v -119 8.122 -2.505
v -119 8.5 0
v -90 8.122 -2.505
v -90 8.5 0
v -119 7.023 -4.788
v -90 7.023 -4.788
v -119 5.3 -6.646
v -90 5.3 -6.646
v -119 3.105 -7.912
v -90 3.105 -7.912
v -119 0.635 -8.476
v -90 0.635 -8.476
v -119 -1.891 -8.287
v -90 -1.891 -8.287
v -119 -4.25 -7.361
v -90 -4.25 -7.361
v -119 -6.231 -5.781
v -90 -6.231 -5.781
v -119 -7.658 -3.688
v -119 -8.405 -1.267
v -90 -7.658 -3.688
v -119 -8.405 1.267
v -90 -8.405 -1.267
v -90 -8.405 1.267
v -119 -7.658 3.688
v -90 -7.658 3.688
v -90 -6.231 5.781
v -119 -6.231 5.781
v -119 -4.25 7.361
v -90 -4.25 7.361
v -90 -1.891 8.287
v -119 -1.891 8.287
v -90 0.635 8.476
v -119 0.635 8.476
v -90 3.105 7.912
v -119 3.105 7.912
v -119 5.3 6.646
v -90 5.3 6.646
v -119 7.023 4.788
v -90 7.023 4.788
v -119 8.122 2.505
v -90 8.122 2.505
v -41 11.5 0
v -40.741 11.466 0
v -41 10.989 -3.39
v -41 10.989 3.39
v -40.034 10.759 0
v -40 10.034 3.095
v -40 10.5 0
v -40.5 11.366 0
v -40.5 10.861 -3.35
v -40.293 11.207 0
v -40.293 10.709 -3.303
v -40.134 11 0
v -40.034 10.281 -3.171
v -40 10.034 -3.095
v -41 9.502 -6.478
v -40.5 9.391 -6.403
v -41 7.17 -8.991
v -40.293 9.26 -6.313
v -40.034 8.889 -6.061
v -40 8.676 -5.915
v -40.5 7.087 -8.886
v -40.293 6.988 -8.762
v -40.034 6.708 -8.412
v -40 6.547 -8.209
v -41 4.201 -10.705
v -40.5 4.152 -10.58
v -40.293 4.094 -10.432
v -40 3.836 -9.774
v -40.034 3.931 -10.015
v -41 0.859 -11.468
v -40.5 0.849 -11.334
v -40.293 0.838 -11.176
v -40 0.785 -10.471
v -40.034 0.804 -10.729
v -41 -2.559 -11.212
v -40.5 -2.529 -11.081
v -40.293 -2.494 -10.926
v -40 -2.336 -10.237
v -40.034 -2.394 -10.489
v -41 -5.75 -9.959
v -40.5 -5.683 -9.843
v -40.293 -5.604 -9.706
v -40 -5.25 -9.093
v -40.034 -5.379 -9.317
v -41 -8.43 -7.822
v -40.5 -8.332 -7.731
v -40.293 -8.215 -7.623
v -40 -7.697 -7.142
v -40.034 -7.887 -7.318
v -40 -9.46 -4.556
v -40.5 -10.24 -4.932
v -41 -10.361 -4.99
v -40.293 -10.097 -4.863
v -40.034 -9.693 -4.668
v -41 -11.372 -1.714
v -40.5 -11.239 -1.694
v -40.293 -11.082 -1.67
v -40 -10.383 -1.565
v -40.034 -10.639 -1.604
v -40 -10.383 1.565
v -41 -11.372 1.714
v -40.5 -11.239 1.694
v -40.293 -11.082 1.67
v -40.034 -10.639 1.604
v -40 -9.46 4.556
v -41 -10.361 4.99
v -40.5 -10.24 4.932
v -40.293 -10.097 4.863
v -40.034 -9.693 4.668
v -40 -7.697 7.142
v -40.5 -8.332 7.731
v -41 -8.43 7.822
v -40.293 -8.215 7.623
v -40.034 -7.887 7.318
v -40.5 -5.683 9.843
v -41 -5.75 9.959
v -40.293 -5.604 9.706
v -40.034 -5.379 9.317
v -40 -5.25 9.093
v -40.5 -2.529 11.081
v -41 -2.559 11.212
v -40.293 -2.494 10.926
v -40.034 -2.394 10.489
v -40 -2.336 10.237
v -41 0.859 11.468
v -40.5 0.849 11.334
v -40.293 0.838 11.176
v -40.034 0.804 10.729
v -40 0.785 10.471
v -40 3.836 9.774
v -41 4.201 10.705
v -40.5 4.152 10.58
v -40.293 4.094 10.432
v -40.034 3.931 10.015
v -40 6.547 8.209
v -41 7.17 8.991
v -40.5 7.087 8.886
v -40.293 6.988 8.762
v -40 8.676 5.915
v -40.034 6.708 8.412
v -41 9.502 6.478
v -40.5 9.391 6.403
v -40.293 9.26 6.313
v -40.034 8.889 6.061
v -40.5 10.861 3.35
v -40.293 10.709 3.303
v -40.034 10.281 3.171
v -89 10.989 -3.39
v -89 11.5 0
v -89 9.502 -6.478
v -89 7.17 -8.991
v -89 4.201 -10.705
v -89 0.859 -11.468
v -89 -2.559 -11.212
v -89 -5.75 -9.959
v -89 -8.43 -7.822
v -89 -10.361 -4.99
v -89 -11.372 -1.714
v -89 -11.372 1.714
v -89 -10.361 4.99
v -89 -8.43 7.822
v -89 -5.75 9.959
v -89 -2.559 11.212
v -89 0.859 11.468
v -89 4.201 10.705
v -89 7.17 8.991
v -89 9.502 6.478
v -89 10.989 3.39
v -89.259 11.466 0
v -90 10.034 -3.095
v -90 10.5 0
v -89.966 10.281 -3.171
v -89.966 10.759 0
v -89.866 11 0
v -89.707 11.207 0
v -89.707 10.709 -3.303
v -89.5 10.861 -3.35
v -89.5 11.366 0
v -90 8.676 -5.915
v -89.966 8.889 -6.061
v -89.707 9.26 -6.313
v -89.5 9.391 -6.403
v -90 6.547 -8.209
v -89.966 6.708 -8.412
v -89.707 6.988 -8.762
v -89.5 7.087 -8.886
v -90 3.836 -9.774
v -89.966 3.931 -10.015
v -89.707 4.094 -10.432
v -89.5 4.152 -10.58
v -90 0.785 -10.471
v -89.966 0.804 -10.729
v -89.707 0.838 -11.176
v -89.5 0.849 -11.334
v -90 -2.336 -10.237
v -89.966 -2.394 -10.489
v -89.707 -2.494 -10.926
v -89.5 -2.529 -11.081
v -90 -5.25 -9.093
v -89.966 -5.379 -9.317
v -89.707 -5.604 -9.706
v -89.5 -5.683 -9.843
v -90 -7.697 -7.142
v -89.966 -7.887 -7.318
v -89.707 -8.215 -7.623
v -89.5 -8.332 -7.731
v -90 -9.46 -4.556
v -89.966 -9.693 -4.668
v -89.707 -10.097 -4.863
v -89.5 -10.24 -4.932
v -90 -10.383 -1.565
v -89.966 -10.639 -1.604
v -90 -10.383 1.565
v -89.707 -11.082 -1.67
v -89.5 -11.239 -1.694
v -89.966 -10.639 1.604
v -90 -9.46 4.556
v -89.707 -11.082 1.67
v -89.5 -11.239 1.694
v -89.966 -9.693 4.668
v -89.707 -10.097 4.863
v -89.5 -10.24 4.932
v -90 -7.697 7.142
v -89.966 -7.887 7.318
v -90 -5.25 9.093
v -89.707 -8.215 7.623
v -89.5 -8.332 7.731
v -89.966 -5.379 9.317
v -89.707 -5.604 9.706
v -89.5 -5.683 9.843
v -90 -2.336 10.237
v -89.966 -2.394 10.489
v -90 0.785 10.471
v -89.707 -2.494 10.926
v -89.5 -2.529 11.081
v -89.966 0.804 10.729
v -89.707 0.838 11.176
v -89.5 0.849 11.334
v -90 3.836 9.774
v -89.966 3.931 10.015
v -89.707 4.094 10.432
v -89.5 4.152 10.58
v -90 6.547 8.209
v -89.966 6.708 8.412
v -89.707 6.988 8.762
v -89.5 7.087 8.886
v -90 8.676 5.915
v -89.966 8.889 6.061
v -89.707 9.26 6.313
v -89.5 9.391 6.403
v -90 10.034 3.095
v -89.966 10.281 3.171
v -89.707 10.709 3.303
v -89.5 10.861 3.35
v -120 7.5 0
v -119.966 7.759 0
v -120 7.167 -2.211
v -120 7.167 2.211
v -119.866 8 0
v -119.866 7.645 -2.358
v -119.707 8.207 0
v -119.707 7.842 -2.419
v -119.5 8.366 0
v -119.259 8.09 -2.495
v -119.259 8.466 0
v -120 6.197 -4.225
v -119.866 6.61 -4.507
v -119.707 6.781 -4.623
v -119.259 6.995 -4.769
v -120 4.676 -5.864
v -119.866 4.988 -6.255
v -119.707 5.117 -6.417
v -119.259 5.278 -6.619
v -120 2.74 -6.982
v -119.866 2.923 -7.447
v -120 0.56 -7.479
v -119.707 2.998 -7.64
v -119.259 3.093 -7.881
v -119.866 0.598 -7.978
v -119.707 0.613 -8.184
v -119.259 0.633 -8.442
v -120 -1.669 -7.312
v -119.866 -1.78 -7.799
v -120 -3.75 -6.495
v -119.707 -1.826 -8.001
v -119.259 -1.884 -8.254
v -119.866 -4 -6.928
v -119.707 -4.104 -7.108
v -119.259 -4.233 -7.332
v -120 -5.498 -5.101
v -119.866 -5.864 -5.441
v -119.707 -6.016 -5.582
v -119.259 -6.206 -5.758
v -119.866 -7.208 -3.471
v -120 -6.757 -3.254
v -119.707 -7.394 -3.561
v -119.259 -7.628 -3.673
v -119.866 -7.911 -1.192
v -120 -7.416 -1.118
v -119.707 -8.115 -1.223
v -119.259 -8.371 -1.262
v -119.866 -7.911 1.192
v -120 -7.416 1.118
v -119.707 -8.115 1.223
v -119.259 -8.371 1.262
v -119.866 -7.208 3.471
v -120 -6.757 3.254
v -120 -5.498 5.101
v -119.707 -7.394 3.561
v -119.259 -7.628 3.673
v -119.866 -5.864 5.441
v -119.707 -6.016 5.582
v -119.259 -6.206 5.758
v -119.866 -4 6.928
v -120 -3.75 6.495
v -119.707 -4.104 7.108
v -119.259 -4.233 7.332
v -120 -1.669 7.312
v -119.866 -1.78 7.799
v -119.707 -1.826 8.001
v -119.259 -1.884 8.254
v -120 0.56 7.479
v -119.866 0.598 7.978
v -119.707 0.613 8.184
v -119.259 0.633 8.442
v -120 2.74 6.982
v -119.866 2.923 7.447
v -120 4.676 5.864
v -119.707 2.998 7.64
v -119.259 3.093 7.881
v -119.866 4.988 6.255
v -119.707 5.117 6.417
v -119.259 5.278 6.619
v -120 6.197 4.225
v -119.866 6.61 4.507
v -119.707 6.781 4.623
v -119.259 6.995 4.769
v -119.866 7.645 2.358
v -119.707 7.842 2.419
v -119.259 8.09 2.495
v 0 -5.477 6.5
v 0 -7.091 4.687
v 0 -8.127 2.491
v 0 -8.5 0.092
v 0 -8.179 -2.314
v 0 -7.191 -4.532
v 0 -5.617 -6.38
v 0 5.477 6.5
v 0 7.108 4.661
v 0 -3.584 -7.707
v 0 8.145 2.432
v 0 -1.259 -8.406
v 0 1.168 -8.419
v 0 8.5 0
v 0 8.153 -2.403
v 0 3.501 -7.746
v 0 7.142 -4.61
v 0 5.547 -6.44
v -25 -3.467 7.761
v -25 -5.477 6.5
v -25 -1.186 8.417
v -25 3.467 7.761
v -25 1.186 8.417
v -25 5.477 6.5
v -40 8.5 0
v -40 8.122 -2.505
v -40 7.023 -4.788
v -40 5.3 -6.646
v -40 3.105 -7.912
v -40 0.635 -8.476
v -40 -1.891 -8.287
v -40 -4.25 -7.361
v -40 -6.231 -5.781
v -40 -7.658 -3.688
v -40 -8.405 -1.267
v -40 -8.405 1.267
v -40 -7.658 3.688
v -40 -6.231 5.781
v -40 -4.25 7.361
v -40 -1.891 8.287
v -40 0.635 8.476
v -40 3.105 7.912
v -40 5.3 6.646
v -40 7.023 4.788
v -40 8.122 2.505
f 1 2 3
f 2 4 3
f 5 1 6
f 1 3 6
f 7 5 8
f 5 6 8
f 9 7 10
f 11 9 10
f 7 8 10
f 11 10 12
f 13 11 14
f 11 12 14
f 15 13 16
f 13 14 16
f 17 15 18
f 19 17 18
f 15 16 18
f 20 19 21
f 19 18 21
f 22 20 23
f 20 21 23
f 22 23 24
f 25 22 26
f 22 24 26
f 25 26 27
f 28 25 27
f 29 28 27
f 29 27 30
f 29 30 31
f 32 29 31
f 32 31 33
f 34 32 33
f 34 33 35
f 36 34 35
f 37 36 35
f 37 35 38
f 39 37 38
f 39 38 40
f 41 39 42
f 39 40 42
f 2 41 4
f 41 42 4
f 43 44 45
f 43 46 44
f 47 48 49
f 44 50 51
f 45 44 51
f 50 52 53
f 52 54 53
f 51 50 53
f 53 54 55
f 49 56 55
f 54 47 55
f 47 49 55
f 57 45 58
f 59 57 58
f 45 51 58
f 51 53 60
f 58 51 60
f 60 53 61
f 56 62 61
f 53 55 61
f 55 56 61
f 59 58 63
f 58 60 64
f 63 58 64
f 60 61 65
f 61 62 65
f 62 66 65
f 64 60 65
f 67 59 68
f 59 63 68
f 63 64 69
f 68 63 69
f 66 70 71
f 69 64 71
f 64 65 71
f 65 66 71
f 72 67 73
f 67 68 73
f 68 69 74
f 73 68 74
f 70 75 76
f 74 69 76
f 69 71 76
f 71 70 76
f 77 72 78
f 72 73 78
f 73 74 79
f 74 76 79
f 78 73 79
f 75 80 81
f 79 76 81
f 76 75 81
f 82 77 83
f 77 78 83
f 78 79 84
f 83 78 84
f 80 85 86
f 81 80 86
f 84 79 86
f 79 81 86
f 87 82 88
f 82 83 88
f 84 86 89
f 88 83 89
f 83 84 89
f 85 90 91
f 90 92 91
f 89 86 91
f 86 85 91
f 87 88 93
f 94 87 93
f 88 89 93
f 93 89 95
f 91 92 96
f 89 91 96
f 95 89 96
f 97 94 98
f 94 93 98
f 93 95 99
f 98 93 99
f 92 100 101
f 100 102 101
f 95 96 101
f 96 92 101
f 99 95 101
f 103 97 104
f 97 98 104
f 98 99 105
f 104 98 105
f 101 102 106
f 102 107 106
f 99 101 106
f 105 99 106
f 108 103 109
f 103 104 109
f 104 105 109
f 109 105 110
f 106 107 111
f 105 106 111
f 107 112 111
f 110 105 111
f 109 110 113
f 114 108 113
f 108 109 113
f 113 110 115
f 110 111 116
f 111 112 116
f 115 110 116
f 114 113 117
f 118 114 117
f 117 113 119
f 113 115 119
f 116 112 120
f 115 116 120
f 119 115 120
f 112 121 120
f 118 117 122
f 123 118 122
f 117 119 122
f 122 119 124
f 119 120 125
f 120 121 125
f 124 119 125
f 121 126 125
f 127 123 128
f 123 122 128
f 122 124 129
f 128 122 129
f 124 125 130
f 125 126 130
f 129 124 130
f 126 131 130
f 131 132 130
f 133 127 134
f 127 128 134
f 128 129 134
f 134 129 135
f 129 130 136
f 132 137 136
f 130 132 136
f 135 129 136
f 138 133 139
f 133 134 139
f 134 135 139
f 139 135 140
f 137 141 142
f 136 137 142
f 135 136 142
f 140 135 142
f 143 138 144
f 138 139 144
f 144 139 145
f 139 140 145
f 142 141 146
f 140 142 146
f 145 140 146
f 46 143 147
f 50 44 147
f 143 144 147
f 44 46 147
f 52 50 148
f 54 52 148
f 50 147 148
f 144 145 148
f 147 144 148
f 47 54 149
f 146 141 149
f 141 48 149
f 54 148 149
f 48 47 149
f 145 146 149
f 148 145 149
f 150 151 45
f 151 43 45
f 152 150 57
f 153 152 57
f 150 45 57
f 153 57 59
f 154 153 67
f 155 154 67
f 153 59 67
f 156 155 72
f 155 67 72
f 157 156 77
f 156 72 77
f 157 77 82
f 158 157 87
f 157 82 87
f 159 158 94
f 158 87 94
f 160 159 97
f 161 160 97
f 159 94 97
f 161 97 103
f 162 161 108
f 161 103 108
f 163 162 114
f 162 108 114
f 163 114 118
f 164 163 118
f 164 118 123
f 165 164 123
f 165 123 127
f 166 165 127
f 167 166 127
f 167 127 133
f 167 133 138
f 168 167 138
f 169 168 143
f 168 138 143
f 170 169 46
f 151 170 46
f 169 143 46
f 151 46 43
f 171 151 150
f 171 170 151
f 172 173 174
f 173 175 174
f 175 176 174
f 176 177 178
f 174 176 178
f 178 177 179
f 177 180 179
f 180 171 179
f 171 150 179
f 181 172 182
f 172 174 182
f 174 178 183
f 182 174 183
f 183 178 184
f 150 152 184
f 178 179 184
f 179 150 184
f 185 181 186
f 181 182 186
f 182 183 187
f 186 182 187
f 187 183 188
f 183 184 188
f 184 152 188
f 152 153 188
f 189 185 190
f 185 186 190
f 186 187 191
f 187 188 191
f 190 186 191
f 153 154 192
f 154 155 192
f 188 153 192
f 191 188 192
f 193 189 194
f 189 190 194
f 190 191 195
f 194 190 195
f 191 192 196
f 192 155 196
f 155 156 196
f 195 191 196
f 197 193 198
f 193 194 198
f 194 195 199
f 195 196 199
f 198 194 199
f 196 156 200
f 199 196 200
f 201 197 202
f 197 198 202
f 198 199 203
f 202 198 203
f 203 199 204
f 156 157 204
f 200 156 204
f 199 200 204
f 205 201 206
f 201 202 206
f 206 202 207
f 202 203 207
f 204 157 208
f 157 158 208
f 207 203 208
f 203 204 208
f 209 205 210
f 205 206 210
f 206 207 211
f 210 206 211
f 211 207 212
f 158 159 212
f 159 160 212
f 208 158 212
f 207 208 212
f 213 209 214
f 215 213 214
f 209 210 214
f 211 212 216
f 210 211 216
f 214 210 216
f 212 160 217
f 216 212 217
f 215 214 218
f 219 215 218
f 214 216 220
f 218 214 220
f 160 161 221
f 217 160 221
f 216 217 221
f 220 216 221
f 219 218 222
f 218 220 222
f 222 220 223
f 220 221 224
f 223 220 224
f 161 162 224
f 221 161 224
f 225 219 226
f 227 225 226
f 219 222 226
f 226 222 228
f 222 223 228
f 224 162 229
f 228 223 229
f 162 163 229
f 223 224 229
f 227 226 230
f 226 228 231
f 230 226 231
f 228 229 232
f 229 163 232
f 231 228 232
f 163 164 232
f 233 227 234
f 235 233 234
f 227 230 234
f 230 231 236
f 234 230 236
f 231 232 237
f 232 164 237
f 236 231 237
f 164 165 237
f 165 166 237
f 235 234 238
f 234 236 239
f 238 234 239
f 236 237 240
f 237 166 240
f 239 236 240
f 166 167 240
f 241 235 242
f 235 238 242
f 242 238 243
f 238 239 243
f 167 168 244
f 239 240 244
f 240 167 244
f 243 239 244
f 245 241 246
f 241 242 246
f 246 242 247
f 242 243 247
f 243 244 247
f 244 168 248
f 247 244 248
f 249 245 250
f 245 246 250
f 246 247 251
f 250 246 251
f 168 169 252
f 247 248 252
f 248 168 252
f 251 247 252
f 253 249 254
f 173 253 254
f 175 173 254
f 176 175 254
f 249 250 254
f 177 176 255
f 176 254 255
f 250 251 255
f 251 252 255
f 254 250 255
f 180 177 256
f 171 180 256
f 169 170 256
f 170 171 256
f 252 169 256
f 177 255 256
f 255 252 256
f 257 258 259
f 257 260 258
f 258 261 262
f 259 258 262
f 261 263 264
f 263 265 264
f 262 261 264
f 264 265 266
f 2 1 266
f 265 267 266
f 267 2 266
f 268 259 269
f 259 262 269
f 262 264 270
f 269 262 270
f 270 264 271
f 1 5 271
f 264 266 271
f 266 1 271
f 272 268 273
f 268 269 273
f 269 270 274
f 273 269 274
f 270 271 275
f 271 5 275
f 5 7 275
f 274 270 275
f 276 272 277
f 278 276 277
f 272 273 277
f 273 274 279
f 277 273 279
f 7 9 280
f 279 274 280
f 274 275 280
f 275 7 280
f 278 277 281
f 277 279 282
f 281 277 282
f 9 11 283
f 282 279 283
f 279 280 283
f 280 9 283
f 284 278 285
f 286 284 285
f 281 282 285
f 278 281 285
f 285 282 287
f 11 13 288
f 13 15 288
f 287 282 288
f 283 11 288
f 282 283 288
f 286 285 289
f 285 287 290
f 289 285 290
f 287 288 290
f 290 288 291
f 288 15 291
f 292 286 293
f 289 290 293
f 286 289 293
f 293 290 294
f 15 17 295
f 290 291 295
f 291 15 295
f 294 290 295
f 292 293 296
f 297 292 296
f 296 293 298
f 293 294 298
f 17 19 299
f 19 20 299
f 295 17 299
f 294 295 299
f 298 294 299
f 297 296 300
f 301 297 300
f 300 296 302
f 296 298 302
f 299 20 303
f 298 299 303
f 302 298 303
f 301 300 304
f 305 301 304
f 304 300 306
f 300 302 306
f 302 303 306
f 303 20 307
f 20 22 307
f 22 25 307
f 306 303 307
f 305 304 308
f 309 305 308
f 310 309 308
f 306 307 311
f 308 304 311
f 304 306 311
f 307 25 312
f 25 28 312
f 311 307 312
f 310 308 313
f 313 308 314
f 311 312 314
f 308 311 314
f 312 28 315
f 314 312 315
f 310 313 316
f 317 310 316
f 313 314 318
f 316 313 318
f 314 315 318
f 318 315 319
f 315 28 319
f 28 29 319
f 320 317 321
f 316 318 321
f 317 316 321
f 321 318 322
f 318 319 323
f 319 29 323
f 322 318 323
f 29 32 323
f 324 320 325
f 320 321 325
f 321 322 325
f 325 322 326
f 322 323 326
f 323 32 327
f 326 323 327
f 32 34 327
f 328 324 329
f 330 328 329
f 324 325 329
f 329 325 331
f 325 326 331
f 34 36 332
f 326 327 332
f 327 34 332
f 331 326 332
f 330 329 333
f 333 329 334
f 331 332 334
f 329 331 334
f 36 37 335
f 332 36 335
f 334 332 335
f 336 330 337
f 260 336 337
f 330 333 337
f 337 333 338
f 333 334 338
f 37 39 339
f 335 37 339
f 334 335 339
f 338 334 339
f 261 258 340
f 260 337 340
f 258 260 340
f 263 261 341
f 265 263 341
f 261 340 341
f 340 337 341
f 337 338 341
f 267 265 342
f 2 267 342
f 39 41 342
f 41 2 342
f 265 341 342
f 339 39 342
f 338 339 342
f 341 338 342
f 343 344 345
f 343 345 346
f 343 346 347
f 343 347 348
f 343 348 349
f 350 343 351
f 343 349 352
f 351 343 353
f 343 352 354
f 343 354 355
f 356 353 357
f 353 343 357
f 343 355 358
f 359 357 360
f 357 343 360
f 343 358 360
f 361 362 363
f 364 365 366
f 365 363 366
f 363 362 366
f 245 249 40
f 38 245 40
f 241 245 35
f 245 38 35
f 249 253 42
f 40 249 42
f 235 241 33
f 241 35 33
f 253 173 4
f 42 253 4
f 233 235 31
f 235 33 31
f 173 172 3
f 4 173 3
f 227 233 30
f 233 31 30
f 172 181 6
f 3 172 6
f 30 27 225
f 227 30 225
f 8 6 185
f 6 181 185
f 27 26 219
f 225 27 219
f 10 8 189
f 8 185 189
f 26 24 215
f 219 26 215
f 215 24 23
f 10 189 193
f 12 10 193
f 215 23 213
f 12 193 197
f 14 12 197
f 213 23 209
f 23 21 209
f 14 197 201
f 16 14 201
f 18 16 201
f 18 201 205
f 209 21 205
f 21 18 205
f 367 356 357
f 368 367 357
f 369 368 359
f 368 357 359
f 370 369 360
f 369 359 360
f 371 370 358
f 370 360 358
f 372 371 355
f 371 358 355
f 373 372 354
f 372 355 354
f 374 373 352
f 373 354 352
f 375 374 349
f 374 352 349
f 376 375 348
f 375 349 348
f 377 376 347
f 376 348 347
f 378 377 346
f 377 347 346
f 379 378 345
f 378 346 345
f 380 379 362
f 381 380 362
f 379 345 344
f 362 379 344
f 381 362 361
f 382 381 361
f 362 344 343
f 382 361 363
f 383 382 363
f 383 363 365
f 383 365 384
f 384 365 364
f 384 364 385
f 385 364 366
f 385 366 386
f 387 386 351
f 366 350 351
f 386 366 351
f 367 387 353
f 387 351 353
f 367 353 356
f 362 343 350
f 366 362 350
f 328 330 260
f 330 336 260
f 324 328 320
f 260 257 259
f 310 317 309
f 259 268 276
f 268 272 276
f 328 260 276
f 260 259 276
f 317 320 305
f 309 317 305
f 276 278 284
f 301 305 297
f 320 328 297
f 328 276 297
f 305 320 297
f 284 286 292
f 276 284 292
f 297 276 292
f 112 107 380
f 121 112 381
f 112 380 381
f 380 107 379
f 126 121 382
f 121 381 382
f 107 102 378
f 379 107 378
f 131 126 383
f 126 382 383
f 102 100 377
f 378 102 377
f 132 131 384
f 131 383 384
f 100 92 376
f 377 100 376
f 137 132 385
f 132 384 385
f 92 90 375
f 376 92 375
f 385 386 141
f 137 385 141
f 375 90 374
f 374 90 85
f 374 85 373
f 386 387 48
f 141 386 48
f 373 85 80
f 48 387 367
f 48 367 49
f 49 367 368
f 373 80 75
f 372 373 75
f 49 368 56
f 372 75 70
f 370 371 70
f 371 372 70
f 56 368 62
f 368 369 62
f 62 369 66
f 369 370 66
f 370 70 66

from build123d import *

# Parameters (mm, degrees)
ENL_V_MAT_EXTRU_6_DEPTH = 25


with BuildPart() as part:
    # Esquisse1 → Révolution1 (revolve)
    with BuildSketch(Plane.XY):
        with BuildLine():
            Line((0, 0), (-120, 0))
            Line((-120, 0), (-120, 7.5))
            ThreePointArc((-120, 7.5), (-119.707106781, 8.207106781), (-119, 8.5))
            Line((-119, 8.5), (-90, 8.5))
            Line((-90, 8.5), (-90, 10.5))
            ThreePointArc((-90, 10.5), (-89.707106781, 11.207106781), (-89, 11.5))
            Line((-89, 11.5), (-41, 11.5))
            ThreePointArc((-41, 11.5), (-40.292893219, 11.207106781), (-40, 10.5))
            Line((-40, 10.5), (-40, 8.5))
            Line((-40, 8.5), (0, 8.5))
            Line((0, 8.5), (0, 0))
        make_face()
    revolve(axis=Axis((0, 0, 0), (-1, 0, 0)))

    # Esquisse6 → Enlèv. mat.-Extru.6 (cut)
    with BuildSketch(Plane(origin=(0, 0, 0), x_dir=(0, 0, -1), z_dir=(1, 0, 0))):
        Polygon((-6.5, 9.404987847), (-6.5, -10.595012153), (-12.325260954, -10.595012153), (-12.325260954, 19.404987847), (-6.5, 19.404987847), align=None)
    extrude(amount=-ENL_V_MAT_EXTRU_6_DEPTH, mode=Mode.SUBTRACT)


solid = part.part
